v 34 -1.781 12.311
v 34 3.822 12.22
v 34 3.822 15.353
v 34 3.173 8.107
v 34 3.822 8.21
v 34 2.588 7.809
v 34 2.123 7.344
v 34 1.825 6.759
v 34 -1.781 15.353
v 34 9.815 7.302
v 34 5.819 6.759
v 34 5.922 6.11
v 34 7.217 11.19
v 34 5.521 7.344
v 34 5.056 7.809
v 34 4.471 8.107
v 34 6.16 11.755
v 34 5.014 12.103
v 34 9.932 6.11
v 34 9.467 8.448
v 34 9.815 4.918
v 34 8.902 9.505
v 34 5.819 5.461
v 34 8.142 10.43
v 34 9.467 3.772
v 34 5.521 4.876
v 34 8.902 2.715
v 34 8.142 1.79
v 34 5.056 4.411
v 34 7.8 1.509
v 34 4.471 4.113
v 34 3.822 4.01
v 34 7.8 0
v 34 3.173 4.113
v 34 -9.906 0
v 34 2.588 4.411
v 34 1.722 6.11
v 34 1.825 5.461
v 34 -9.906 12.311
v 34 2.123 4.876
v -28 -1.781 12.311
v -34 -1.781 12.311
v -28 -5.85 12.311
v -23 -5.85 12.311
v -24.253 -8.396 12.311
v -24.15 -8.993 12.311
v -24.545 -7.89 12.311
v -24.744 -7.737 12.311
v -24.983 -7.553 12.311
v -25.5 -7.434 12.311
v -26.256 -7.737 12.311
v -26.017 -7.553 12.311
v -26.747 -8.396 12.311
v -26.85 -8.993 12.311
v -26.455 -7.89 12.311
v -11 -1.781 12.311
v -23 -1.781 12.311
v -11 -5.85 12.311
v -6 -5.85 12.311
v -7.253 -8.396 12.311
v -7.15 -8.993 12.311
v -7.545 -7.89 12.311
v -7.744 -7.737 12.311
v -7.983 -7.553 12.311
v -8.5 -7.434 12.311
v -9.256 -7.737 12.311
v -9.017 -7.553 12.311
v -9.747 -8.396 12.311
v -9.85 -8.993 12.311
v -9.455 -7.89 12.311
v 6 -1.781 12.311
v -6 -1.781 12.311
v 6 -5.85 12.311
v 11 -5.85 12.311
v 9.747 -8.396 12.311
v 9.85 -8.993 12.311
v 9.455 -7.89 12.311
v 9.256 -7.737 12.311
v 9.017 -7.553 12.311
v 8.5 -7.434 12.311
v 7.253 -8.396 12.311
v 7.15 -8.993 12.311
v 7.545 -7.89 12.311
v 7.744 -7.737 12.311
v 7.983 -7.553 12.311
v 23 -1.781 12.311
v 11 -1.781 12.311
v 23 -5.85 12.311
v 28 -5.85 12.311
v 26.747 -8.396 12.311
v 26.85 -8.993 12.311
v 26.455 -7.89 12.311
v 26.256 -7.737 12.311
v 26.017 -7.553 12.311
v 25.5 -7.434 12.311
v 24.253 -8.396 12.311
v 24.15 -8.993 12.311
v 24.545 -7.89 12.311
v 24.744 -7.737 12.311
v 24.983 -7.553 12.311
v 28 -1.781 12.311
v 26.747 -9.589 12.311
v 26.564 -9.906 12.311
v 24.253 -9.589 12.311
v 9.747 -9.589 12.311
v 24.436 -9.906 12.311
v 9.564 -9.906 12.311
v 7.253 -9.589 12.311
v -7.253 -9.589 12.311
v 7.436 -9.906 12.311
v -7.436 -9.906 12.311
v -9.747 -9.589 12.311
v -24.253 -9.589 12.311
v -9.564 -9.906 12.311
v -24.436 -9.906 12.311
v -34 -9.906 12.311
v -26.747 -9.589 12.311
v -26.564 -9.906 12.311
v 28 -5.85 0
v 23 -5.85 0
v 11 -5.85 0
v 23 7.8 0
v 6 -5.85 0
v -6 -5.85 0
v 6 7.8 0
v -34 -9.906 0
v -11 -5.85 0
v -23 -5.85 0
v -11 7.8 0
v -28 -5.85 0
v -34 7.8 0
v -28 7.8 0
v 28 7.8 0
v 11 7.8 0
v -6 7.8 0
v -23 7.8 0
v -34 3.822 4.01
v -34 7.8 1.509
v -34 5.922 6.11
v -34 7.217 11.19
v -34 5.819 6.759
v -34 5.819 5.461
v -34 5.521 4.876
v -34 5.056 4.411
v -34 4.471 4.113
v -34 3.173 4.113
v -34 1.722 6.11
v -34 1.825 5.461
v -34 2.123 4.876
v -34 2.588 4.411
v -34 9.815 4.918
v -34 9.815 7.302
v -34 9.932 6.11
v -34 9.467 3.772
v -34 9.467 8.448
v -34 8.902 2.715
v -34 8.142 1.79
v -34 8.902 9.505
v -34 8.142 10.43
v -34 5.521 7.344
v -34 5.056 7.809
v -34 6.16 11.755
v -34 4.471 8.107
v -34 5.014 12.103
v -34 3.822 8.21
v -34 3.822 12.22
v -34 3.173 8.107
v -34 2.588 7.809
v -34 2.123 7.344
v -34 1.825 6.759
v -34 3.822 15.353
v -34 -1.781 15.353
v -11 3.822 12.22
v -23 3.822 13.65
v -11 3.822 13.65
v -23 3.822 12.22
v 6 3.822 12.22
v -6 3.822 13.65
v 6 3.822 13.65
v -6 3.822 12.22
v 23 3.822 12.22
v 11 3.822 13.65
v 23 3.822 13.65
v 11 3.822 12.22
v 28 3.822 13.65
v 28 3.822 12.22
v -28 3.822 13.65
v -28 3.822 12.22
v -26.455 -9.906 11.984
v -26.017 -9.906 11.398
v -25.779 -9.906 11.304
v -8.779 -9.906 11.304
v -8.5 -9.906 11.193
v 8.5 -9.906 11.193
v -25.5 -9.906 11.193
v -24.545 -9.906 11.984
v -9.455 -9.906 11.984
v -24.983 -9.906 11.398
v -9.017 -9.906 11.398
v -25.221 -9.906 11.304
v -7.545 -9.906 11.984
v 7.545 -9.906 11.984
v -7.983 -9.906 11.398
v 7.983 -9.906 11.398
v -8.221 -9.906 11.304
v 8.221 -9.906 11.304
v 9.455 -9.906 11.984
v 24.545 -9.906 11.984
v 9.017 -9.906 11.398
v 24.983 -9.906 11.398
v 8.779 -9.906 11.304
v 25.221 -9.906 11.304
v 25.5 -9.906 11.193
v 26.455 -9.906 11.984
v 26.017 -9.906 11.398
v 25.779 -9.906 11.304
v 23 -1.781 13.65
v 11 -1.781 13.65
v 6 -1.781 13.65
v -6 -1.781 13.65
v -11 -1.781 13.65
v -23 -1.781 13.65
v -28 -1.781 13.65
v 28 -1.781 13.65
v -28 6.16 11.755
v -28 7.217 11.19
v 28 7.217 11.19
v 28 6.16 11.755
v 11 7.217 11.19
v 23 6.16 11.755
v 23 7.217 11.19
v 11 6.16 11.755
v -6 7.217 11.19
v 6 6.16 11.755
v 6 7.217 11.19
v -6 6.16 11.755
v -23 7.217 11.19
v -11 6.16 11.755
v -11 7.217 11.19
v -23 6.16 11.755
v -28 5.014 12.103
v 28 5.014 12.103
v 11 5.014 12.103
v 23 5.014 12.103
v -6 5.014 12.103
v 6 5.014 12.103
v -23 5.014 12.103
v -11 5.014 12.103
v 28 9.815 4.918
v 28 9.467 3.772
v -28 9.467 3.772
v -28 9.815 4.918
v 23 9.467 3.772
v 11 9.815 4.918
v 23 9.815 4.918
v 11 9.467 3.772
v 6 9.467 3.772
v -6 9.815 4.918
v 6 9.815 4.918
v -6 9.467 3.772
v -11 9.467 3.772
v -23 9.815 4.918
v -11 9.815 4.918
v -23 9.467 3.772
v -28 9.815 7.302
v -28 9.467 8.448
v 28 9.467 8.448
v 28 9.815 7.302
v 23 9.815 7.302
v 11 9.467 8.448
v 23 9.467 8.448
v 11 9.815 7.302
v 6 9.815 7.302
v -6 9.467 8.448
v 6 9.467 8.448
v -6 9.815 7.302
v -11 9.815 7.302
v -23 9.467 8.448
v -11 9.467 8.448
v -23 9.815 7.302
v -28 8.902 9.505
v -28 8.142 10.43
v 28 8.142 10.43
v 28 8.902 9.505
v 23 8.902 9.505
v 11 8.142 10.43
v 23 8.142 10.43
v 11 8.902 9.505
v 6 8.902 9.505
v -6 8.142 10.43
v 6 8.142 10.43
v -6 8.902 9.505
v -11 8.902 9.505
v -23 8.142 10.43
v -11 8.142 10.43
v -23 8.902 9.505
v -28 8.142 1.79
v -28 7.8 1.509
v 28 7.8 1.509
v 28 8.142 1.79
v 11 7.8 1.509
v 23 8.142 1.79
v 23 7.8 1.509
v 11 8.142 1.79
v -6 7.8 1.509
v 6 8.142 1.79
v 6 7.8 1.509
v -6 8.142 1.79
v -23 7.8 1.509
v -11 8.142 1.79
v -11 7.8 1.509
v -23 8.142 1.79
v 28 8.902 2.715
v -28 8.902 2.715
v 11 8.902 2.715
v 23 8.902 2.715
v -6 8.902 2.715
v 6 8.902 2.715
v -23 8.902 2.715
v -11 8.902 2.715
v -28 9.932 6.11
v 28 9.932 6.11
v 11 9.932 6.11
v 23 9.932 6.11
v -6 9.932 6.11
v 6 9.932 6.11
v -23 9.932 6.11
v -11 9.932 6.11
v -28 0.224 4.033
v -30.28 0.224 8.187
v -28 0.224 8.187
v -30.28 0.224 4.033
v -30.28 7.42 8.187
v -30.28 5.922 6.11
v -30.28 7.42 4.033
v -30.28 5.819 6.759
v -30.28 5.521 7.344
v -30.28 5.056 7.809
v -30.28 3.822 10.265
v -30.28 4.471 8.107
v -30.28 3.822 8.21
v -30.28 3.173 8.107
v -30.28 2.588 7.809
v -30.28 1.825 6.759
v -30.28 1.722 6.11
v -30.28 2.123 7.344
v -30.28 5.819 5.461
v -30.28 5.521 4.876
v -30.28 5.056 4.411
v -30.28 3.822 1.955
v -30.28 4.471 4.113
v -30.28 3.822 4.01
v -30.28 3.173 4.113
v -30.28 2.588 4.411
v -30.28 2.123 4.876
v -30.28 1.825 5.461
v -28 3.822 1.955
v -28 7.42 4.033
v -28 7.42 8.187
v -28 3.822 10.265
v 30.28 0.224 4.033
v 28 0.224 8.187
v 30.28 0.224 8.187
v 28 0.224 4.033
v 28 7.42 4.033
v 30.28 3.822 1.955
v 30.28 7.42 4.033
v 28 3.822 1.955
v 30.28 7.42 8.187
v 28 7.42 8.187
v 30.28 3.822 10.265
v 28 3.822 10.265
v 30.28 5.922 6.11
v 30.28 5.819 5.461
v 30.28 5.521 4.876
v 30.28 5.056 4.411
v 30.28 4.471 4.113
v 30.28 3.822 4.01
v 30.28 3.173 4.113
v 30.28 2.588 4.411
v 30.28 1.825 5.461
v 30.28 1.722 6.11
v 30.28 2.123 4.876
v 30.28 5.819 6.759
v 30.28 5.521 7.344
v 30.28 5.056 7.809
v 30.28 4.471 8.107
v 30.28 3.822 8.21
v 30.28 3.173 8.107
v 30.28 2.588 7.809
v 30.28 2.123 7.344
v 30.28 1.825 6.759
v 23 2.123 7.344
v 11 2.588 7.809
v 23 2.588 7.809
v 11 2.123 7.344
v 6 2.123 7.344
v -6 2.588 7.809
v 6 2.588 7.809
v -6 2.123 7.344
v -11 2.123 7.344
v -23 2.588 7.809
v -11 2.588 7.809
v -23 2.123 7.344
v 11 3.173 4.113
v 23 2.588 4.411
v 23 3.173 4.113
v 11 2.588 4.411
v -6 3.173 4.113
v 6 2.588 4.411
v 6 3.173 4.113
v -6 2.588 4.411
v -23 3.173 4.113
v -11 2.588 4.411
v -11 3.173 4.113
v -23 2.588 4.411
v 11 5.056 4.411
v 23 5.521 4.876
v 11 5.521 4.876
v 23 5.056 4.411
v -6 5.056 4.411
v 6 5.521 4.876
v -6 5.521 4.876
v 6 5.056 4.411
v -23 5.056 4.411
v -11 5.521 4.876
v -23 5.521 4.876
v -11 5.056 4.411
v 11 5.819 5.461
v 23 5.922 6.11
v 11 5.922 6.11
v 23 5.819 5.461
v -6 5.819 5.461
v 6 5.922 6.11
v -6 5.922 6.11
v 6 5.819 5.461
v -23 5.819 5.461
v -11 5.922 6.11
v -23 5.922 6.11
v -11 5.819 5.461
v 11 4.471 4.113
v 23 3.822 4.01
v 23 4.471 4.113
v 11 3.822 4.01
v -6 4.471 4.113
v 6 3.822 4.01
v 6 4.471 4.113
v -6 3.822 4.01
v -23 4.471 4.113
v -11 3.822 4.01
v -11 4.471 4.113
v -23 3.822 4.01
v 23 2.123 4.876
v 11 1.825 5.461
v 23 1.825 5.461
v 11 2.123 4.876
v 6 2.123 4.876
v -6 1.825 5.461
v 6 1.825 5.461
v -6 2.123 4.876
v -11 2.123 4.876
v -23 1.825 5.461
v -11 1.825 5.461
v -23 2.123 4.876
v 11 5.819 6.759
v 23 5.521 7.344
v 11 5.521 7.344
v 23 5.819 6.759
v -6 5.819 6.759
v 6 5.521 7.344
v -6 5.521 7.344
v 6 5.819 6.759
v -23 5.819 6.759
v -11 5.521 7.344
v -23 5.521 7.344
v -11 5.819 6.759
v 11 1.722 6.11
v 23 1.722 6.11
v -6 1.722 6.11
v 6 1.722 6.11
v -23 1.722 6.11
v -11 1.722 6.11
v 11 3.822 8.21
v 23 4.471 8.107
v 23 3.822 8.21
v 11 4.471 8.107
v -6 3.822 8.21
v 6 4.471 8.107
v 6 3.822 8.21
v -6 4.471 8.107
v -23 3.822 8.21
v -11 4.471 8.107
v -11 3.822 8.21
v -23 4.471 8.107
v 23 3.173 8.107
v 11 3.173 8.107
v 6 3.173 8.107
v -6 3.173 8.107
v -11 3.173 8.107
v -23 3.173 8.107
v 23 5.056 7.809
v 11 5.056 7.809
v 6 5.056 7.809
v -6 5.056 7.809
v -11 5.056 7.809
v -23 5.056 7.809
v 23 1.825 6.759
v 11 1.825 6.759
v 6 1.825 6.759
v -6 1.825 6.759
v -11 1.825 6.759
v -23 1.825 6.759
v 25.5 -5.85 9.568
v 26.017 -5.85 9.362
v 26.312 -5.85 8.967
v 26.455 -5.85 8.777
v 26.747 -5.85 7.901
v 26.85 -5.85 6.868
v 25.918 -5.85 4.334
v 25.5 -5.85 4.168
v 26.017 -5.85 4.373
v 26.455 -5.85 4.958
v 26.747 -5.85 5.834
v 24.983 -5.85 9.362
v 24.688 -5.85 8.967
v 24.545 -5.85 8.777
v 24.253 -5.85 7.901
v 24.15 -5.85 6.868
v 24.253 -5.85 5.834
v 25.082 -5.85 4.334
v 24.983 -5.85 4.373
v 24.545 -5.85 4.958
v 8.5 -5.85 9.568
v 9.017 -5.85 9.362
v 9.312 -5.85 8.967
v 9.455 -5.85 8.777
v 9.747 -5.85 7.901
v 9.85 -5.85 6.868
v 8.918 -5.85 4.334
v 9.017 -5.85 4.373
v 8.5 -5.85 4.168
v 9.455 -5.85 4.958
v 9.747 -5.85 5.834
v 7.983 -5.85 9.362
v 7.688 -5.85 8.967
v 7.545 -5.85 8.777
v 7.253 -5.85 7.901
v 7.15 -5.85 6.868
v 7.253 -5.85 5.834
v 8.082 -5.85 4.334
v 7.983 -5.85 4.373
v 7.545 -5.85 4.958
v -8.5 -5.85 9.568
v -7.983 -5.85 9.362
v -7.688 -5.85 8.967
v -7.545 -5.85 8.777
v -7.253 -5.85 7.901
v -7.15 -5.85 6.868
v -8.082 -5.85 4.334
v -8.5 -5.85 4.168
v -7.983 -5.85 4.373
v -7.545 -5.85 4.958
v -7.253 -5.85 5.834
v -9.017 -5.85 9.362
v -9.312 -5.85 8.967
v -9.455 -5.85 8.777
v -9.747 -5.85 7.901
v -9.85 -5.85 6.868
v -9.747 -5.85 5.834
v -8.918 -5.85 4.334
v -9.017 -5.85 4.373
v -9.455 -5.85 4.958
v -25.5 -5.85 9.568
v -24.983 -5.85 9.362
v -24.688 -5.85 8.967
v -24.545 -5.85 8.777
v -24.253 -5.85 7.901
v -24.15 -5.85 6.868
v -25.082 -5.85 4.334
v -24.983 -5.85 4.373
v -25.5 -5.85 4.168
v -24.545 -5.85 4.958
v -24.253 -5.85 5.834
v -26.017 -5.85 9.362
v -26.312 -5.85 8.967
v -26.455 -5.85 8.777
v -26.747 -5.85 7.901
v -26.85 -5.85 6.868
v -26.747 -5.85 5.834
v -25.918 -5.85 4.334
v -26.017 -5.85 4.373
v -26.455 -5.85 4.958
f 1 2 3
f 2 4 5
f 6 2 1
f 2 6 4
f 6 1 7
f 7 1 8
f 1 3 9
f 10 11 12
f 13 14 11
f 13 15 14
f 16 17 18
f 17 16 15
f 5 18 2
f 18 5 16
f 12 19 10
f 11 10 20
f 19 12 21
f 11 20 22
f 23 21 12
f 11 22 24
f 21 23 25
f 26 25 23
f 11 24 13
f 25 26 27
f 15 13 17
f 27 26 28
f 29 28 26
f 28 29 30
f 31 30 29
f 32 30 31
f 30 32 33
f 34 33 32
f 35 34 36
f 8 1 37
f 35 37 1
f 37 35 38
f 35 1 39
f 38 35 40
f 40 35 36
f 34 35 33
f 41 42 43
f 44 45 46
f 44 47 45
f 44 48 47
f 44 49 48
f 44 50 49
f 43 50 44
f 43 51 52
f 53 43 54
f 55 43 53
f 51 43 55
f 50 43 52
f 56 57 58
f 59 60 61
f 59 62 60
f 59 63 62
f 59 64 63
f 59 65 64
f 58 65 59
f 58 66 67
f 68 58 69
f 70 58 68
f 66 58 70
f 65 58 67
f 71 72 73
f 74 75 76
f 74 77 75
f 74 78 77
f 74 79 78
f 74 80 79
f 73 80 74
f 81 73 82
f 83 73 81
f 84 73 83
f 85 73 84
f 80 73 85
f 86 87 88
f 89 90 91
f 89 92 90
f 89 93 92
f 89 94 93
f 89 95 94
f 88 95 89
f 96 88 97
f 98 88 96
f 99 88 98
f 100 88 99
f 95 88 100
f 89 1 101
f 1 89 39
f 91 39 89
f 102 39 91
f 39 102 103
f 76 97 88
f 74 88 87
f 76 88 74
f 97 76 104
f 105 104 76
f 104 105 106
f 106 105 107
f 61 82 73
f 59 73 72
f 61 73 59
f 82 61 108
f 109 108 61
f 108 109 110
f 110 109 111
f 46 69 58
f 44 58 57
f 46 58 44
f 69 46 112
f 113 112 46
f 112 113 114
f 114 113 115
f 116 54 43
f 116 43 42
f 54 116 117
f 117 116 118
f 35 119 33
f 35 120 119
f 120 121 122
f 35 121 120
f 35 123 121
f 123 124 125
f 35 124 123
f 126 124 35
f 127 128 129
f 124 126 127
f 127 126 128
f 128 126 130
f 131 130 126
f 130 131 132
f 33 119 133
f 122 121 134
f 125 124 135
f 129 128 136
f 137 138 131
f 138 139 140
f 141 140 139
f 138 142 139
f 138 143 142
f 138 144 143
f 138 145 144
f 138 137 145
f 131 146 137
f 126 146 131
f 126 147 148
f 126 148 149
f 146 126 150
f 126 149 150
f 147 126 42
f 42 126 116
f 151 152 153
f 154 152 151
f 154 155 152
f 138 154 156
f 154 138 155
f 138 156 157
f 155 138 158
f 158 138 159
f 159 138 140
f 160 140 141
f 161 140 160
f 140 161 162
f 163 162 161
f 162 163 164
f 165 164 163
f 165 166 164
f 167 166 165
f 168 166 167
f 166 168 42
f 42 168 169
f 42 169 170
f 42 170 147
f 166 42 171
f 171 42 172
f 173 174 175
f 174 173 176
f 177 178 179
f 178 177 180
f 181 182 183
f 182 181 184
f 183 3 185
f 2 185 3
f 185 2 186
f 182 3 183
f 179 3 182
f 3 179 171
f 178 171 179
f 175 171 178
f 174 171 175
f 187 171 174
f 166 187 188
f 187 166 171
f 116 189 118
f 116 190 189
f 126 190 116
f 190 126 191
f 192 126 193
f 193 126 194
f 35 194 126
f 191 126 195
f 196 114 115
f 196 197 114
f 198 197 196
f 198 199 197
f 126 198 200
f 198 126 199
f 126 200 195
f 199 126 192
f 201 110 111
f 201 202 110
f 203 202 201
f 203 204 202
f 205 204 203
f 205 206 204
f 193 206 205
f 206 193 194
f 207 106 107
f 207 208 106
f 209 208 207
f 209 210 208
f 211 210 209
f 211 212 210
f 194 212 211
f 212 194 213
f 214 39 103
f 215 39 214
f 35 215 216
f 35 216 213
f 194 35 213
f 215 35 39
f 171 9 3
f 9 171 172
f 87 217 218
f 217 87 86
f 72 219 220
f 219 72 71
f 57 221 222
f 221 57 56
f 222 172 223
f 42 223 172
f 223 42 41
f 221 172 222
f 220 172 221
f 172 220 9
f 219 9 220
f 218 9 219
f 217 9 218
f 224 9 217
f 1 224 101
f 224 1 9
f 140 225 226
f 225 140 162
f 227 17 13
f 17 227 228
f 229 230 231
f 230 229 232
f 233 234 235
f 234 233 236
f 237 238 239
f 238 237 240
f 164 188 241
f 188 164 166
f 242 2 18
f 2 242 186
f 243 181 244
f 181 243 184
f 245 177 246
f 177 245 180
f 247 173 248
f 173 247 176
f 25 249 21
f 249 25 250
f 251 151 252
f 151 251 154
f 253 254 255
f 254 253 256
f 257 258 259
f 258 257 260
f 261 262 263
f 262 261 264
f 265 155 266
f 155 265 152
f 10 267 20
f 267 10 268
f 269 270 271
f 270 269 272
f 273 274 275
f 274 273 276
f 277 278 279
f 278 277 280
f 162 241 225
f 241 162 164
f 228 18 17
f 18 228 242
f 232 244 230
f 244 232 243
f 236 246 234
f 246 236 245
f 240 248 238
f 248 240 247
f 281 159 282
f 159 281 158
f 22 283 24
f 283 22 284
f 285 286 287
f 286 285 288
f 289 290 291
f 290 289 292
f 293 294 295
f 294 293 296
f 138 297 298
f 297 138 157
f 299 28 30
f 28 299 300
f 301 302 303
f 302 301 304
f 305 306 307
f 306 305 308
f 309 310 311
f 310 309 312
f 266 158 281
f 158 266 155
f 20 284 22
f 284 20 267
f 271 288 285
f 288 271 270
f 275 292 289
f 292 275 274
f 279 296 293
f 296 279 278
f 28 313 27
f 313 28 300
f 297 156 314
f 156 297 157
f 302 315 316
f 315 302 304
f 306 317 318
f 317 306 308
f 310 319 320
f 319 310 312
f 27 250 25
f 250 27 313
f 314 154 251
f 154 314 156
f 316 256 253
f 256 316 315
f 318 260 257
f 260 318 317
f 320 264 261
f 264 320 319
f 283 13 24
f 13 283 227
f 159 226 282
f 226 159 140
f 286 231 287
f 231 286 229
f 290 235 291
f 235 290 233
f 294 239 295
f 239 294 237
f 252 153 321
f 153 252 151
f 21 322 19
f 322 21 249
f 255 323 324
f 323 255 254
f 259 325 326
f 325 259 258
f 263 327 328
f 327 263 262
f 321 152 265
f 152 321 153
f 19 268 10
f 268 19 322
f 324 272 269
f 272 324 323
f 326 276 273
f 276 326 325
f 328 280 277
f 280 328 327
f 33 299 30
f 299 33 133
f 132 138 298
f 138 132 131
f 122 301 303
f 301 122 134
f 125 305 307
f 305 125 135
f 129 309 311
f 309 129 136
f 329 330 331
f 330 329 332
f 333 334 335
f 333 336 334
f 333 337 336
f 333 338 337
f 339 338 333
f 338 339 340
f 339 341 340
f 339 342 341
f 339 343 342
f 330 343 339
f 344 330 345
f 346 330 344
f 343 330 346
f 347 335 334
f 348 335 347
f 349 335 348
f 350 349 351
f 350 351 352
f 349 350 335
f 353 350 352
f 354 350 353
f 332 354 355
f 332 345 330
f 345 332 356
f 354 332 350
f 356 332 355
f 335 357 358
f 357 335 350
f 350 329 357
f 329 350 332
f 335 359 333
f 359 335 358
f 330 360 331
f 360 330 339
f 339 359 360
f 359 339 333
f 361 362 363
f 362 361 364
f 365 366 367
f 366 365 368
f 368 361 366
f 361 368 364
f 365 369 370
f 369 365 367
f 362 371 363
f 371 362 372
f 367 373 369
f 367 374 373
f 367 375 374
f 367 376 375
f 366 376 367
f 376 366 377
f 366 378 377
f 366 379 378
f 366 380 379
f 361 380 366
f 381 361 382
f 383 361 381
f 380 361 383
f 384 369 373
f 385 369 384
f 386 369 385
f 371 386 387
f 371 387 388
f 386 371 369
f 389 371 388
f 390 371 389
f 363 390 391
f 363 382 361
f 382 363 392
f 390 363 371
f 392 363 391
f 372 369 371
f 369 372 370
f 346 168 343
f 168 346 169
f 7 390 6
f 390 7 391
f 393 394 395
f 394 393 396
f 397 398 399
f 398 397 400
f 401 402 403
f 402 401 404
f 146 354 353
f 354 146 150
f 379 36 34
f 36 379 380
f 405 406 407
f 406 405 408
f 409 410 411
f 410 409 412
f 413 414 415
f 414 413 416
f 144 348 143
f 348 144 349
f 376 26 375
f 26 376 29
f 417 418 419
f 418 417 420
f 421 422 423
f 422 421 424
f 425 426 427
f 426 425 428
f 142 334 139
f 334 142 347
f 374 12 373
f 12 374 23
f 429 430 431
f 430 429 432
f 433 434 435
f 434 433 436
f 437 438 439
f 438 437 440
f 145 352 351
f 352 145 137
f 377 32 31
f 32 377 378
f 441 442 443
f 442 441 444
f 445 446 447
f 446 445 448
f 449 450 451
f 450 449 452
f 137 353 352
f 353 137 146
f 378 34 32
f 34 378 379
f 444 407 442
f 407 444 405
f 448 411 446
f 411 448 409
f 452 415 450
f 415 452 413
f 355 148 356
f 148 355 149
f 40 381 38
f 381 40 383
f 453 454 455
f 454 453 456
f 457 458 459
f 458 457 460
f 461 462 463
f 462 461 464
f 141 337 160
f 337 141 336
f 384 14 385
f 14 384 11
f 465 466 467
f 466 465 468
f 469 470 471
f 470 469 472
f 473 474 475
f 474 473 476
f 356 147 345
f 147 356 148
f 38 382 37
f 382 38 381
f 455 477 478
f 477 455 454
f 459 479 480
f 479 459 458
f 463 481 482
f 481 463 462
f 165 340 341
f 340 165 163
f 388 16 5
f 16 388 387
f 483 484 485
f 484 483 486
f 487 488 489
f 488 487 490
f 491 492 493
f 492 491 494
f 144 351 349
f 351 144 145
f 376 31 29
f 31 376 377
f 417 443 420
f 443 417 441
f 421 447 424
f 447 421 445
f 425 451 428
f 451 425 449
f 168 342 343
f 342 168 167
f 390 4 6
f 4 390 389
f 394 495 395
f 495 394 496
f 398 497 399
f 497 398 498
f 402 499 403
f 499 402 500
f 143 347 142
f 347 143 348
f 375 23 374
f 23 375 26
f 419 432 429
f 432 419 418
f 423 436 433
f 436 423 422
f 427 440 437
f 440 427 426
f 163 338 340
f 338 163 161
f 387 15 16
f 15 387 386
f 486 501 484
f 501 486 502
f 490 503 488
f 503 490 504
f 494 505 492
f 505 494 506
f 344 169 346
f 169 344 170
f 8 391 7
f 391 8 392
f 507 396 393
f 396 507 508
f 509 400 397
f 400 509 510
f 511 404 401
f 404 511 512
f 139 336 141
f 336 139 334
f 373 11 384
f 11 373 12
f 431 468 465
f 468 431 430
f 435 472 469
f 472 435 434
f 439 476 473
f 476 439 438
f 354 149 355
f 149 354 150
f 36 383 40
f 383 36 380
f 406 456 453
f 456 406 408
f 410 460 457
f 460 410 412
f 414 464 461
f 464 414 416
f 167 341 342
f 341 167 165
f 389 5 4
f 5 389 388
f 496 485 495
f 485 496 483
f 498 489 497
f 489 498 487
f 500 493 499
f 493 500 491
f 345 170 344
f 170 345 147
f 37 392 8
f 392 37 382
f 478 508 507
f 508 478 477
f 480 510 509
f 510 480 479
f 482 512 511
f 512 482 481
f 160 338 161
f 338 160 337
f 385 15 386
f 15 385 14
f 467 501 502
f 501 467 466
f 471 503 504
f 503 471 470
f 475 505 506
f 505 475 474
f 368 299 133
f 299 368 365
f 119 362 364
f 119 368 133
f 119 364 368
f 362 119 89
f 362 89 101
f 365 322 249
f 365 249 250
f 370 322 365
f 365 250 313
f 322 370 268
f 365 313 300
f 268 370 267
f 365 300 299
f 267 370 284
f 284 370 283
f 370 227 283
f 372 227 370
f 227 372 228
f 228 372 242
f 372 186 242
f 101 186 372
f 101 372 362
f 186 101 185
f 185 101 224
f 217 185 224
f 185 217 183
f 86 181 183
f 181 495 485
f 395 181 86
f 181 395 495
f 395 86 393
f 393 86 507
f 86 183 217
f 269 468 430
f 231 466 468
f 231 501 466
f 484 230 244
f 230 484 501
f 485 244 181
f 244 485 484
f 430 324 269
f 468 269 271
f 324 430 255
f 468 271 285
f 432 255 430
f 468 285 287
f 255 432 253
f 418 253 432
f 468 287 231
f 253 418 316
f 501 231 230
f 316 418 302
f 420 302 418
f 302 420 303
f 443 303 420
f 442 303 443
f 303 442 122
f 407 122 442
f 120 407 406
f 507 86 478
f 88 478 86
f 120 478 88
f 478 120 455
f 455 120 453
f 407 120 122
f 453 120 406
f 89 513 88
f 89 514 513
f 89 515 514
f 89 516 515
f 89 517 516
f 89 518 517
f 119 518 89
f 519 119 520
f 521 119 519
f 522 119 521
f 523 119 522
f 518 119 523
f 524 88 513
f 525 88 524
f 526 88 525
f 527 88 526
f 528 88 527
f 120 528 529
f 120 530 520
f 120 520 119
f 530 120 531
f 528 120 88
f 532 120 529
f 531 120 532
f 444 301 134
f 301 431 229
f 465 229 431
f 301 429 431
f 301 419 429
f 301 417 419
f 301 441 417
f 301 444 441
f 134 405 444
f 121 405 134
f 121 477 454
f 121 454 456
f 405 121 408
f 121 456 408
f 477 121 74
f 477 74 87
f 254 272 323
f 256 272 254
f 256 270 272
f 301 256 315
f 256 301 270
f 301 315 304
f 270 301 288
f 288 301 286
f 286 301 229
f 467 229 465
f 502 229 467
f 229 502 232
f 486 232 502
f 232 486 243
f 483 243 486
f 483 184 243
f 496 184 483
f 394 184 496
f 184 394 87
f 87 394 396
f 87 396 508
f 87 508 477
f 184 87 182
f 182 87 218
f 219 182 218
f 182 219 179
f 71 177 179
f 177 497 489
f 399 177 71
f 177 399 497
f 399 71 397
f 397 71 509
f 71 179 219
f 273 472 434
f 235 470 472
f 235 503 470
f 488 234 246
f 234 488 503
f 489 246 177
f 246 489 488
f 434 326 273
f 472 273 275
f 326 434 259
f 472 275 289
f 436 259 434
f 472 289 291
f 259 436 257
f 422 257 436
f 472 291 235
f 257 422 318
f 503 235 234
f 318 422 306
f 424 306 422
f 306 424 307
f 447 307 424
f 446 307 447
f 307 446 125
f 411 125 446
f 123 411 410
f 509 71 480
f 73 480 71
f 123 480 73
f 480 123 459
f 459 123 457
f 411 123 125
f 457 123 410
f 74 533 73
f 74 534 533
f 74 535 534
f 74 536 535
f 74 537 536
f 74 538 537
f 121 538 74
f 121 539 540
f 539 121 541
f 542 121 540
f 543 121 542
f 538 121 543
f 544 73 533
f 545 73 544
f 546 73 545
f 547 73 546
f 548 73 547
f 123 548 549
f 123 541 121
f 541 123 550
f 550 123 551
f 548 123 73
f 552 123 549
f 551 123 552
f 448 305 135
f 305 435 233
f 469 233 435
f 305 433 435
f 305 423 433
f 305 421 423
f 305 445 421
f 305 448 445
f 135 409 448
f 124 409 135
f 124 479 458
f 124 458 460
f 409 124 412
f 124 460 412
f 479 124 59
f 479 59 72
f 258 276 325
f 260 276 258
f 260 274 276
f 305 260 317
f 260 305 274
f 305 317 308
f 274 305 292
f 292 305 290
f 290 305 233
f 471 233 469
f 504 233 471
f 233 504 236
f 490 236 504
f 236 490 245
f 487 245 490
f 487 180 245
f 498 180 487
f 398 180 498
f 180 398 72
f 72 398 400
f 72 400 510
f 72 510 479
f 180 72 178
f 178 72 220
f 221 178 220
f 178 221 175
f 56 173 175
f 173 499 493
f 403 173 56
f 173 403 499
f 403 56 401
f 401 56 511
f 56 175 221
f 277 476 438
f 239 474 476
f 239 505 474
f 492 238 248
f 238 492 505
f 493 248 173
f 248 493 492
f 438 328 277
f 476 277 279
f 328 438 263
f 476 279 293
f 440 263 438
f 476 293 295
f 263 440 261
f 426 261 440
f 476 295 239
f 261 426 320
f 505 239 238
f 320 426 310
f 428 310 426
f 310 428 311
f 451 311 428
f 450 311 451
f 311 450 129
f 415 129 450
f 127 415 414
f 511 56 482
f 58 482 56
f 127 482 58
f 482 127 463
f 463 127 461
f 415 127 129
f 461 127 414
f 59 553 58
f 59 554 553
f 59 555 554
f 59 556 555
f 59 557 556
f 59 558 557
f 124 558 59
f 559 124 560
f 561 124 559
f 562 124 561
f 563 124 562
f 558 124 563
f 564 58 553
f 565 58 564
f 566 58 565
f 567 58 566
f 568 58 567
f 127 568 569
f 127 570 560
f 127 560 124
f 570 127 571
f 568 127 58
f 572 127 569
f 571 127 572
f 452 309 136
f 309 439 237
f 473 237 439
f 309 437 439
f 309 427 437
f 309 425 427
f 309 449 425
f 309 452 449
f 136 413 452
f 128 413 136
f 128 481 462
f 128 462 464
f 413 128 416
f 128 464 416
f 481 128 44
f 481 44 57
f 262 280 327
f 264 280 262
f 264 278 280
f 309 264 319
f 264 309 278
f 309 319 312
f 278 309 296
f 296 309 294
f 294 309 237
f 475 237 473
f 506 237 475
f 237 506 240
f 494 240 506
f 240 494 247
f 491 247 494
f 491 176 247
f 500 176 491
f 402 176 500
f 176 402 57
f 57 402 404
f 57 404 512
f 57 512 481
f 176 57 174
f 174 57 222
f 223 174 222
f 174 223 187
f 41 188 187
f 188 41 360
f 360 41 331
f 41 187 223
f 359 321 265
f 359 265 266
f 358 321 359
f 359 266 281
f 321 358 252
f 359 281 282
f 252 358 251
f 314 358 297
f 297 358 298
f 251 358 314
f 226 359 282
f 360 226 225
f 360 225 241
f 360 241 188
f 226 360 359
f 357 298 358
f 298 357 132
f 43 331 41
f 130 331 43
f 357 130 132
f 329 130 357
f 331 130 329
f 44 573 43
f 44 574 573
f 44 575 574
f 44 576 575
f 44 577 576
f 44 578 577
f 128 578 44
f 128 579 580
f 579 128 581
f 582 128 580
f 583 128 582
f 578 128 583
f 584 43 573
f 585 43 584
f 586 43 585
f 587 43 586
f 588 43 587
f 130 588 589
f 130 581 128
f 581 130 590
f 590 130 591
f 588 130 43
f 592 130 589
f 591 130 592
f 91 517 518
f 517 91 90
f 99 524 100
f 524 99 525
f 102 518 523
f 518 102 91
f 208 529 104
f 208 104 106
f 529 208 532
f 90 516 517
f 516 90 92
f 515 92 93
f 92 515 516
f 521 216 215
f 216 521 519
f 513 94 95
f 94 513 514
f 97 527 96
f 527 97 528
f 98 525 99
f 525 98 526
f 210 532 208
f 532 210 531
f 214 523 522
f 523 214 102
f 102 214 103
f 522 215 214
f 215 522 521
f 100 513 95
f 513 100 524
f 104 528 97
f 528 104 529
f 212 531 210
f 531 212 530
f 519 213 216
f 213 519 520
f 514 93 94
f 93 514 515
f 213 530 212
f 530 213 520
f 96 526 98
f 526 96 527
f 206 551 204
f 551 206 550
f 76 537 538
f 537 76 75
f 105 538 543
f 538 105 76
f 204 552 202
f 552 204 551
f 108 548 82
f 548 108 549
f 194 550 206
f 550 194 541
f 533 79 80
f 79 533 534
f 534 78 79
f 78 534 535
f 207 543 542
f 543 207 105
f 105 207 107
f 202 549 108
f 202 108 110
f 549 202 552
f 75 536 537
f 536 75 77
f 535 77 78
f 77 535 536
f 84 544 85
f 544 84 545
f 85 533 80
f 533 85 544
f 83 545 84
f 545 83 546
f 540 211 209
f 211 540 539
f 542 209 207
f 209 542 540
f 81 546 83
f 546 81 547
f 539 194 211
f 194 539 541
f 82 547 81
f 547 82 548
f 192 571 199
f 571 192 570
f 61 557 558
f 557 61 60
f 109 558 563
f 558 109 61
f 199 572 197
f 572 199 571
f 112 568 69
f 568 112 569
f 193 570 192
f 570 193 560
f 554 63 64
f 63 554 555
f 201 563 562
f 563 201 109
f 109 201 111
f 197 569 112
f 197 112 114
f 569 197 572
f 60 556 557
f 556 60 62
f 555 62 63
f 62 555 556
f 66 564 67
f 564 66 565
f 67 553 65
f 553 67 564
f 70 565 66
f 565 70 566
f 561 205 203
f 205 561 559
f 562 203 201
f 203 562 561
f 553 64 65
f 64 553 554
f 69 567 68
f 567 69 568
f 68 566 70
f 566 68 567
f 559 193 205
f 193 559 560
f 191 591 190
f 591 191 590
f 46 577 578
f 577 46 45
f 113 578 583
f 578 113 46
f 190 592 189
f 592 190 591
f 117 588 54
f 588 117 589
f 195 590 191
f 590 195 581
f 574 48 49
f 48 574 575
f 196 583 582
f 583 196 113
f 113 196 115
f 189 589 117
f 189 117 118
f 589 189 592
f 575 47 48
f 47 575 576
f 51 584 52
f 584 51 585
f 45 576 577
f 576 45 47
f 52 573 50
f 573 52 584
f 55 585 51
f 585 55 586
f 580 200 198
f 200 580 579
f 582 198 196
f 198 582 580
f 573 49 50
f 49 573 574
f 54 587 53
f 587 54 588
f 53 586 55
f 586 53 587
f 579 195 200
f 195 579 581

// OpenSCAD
/*

Parametric Robohand Knuckle Block
By David Orgeman

Released under the terms of the GNU GPL v3.0 

This program is free software: you can redistribute it and/or modify
it under the terms of the GNU General Public License as published by
the Free Software Foundation, either version 3 of the License, or
(at your option) any later version.

This program is distributed in the hope that it will be useful,
but WITHOUT ANY WARRANTY; without even the implied warranty of
MERCHANTABILITY or FITNESS FOR A PARTICULAR PURPOSE. See the
GNU General Public License for more details.

You should have received a copy of the GNU General Public License
along with this program. If not, see <http://www.gnu.org/licenses/>.

*/



//PARAMETERS

//Standard holes for tapping threads in plastic
M3T=2.5;
M4T=3.3;
M5T=4.2;

//Standard hole sizes for metric screws
M3=3.3;
M4=4.4;
M5=5.5;

// Set the FScale variable to match the scale factor used with other parts.
// That will ensure that the parts mesh properly.  Set the FWidth if the 
// finger tabs are too tight or too loose laterally in their slots.

//Set FScale to match the scaling of the other Robohand parts.
FScale=1.3;

//Change the commenting to select either the default width or a custom value.
//FWidth=(3.2+0.6)*FScale;
FWidth=4.4+0.6;

//These hole sizes are consistent regardless of the scale factor.  KSize1 is
//the hole for the knuckle grub screw.  KSize2 is the knuckle screw hole size
// on the outside so that it can be tapped.  HSize is the hole for the strings.
//HSize needs to allow for both the bungee and the draw string.
KSize1=M4-0.2;
KSize2=M4-0.2;
HSize=2.7;

//If NutTraps is true, then these parameters control the size of the trap.
//For the nut trap, measure nut width flat to flat and make that NutW.
//NutR is then the conversion to make the needed hole.  NutT is how thick
//the nut is.
NutTraps=true;
NutW=6.85;
NutR=(NutW/cos(30)+0.4)/2;
NutT=2.08+0.2;
//NutT=3.04+0.2;
//NutT=4.90+0.2;

//SlotSep is the space between the slots.  Use either the modified default
//scaled version, or a static number.
SlotAdj=-1.0;
SlotSep=10*FScale+SlotAdj;
//SlotSep=10;


//The Support variable just adds blocks to the knuckle tabs in hopes of
//better printing.  The corners would then need to be sanded off.  I have
//found that there are always corners that need to be removed.  The hope
//is that this will be no worse, but will print the curve better.
Support=true;


//RENDER

//Remove static sized portions 
difference()
	{

//Scale everything that is not static
	scale([FScale, FScale, FScale])
		{

//Build the main block out of separate shapes
		union()
			{
			translate([-(4*SlotSep+4*FWidth)/(2*FScale), -7.62, 0])
				cube([(4*SlotSep+4*FWidth)/FScale, 10.56, 9.47]);
			translate([-(4*SlotSep+4*FWidth)/(2*FScale), -1.37, 8])
				cube([(4*SlotSep+4*FWidth)/FScale, 4.31, 3.81]);
			translate([-(4*SlotSep+4*FWidth)/(2*FScale), 10.56-7.62, 9.4/2])
				rotate(a=[0, 90, 0])
					cylinder(h=(4*SlotSep+4*FWidth)/FScale, r=9.4/2, $fn=32);	
			if (Support)
				{
				translate([-(4*SlotSep+4*FWidth)/(2*FScale), -7, 0])
					cube([(4*SlotSep+4*FWidth)/FScale, 13, 4]);
				}	
			}

		}

//Put in the holes that never change size

//Screw holes to hold the fingers on
	translate([-(3*SlotSep+2*FWidth)/2-1, 2.94*FScale, 4.7*FScale])
		rotate(a=[0, 90, 0])
			cylinder(h=3*SlotSep+2*FWidth+2, r=KSize1/2, $fn=20);
	translate([-(4*SlotSep+4*FWidth)/2-1, 2.94*FScale, 4.7*FScale])
		rotate(a=[0, 90, 0])
			cylinder(h=4*SlotSep+4*FWidth+2, r=KSize2/2, $fn=20);

//Slots to insert the proximal sections
	translate([1.5*SlotSep+FWidth, -4.5*FScale, -1])
		cube([FWidth, 30, 10.5*FScale+1]);
	translate([0.5*SlotSep, -4.5*FScale, -1])
		cube([FWidth, 30, 10.5*FScale+1]);
	translate([-0.5*SlotSep-FWidth, -4.5*FScale, -1])
		cube([FWidth, 30, 10.5*FScale+1]);
	translate([-1.5*SlotSep-2*FWidth, -4.5*FScale, -1])
		cube([FWidth, 30, 10.5*FScale+1]);

//Holes for strings
	translate([1.5*SlotSep+1.5*FWidth, -1.45*FScale, 0])
		rotate(a=[30, 0, 0])
			cylinder(h=30, r=HSize/2, $fn=16);
	translate([0.5*SlotSep+0.5*FWidth, -1.45*FScale, 0])
		rotate(a=[30, 0, 0])
			cylinder(h=30, r=HSize/2, $fn=16);
	translate([-0.5*SlotSep-0.5*FWidth, -1.45*FScale, 0])
		rotate(a=[30, 0, 0])
			cylinder(h=30, r=HSize/2, $fn=16);
	translate([-1.5*SlotSep-1.5*FWidth, -1.45*FScale, 0])
		rotate(a=[30, 0, 0])
			cylinder(h=30, r=HSize/2, $fn=16);

	if (NutTraps)
		{
//		hull()
//			{
			translate([-1.5*SlotSep-2*FWidth-NutT, 2.94*FScale, 4.7*FScale])	
				rotate(a=[0, 90, 0])
					cylinder(h=NutT+1, r=NutR, $fn=6);
//			translate([-SlotSep-FWidth-NutT/2, 2.94*FScale, 20*FScale])
//				rotate(a=[0, 90, 0])
//					cylinder(h=NutT, r=NutR, $fn=6);
//			}
//		hull()
//			{
			translate([1.5*SlotSep+2*FWidth-1, 2.94*FScale, 4.7*FScale])	
				rotate(a=[0, 90, 0])
					cylinder(h=NutT+1, r=NutR, $fn=6);
//			translate([SlotSep+FWidth-NutT/2, 2.94*FScale, 20*FScale])
//				rotate(a=[0, 90, 0])
//					cylinder(h=NutT, r=NutR, $fn=6);
//			}
		}
	}




module fillet(r, h) 
	{
	translate([r/2, r/2, 0])
		difference() 
			{
			cube([r, r, h], center=true);
			translate([r/2, r/2, 0])
				cylinder(h=h+1, r=r, center=true, $fn=40);
			}
	}


module fillet_bez(r, h, a=90) 
	{
	p0=[r, 0];
	p1=[0, 0];
	p2=[r*cos(a), r*sin(a)];
	translate([0, 0, -h/2])
		linear_extrude(height=h) BezConic(p0, p1, p2, 32);
	}


// By nophead
module polyhole(d, h) 
	{
	n=max(round(2*d), 3);
	rotate(v=[0, 0, 180])
		cylinder(h=h, r=(d/2)/cos(180/n), center=true, $fn=n);
	}


/* 
Conic Bezier Curve
also known as Quadratic Bezier Curve
also known as Bezier Curve with 3 control points 

Please see 
http://www.thingiverse.com/thing:8443 by William A Adams
http://en.wikipedia.org/wiki/File:Bezier_2_big.gif by Phil Tregoning
http://en.wikipedia.org/wiki/B%C3%A9zier_curve by Wikipedia editors

By Don B, 2011, released into the Public Domain
*/

module BezConic(p0, p1, p2, steps=5) {

	stepsize1 = (p1-p0)/steps;
	stepsize2 = (p2-p1)/steps;

	for (i=[0 : steps-1]) {
		assign(point1 = p0+stepsize1*i) 
		assign(point2 = p1+stepsize2*i) 
		assign(point3 = p0+stepsize1*(i+1))
		assign(point4 = p1+stepsize2*(i+1))  {
			assign( bpoint1 = point1+(point2-point1)*(i/steps) )
			assign( bpoint2 = point3+(point4-point3)*((i+1)/steps) ) {
				polygon(points=[bpoint1, bpoint2, p1]);
			}
		}
	}
}
